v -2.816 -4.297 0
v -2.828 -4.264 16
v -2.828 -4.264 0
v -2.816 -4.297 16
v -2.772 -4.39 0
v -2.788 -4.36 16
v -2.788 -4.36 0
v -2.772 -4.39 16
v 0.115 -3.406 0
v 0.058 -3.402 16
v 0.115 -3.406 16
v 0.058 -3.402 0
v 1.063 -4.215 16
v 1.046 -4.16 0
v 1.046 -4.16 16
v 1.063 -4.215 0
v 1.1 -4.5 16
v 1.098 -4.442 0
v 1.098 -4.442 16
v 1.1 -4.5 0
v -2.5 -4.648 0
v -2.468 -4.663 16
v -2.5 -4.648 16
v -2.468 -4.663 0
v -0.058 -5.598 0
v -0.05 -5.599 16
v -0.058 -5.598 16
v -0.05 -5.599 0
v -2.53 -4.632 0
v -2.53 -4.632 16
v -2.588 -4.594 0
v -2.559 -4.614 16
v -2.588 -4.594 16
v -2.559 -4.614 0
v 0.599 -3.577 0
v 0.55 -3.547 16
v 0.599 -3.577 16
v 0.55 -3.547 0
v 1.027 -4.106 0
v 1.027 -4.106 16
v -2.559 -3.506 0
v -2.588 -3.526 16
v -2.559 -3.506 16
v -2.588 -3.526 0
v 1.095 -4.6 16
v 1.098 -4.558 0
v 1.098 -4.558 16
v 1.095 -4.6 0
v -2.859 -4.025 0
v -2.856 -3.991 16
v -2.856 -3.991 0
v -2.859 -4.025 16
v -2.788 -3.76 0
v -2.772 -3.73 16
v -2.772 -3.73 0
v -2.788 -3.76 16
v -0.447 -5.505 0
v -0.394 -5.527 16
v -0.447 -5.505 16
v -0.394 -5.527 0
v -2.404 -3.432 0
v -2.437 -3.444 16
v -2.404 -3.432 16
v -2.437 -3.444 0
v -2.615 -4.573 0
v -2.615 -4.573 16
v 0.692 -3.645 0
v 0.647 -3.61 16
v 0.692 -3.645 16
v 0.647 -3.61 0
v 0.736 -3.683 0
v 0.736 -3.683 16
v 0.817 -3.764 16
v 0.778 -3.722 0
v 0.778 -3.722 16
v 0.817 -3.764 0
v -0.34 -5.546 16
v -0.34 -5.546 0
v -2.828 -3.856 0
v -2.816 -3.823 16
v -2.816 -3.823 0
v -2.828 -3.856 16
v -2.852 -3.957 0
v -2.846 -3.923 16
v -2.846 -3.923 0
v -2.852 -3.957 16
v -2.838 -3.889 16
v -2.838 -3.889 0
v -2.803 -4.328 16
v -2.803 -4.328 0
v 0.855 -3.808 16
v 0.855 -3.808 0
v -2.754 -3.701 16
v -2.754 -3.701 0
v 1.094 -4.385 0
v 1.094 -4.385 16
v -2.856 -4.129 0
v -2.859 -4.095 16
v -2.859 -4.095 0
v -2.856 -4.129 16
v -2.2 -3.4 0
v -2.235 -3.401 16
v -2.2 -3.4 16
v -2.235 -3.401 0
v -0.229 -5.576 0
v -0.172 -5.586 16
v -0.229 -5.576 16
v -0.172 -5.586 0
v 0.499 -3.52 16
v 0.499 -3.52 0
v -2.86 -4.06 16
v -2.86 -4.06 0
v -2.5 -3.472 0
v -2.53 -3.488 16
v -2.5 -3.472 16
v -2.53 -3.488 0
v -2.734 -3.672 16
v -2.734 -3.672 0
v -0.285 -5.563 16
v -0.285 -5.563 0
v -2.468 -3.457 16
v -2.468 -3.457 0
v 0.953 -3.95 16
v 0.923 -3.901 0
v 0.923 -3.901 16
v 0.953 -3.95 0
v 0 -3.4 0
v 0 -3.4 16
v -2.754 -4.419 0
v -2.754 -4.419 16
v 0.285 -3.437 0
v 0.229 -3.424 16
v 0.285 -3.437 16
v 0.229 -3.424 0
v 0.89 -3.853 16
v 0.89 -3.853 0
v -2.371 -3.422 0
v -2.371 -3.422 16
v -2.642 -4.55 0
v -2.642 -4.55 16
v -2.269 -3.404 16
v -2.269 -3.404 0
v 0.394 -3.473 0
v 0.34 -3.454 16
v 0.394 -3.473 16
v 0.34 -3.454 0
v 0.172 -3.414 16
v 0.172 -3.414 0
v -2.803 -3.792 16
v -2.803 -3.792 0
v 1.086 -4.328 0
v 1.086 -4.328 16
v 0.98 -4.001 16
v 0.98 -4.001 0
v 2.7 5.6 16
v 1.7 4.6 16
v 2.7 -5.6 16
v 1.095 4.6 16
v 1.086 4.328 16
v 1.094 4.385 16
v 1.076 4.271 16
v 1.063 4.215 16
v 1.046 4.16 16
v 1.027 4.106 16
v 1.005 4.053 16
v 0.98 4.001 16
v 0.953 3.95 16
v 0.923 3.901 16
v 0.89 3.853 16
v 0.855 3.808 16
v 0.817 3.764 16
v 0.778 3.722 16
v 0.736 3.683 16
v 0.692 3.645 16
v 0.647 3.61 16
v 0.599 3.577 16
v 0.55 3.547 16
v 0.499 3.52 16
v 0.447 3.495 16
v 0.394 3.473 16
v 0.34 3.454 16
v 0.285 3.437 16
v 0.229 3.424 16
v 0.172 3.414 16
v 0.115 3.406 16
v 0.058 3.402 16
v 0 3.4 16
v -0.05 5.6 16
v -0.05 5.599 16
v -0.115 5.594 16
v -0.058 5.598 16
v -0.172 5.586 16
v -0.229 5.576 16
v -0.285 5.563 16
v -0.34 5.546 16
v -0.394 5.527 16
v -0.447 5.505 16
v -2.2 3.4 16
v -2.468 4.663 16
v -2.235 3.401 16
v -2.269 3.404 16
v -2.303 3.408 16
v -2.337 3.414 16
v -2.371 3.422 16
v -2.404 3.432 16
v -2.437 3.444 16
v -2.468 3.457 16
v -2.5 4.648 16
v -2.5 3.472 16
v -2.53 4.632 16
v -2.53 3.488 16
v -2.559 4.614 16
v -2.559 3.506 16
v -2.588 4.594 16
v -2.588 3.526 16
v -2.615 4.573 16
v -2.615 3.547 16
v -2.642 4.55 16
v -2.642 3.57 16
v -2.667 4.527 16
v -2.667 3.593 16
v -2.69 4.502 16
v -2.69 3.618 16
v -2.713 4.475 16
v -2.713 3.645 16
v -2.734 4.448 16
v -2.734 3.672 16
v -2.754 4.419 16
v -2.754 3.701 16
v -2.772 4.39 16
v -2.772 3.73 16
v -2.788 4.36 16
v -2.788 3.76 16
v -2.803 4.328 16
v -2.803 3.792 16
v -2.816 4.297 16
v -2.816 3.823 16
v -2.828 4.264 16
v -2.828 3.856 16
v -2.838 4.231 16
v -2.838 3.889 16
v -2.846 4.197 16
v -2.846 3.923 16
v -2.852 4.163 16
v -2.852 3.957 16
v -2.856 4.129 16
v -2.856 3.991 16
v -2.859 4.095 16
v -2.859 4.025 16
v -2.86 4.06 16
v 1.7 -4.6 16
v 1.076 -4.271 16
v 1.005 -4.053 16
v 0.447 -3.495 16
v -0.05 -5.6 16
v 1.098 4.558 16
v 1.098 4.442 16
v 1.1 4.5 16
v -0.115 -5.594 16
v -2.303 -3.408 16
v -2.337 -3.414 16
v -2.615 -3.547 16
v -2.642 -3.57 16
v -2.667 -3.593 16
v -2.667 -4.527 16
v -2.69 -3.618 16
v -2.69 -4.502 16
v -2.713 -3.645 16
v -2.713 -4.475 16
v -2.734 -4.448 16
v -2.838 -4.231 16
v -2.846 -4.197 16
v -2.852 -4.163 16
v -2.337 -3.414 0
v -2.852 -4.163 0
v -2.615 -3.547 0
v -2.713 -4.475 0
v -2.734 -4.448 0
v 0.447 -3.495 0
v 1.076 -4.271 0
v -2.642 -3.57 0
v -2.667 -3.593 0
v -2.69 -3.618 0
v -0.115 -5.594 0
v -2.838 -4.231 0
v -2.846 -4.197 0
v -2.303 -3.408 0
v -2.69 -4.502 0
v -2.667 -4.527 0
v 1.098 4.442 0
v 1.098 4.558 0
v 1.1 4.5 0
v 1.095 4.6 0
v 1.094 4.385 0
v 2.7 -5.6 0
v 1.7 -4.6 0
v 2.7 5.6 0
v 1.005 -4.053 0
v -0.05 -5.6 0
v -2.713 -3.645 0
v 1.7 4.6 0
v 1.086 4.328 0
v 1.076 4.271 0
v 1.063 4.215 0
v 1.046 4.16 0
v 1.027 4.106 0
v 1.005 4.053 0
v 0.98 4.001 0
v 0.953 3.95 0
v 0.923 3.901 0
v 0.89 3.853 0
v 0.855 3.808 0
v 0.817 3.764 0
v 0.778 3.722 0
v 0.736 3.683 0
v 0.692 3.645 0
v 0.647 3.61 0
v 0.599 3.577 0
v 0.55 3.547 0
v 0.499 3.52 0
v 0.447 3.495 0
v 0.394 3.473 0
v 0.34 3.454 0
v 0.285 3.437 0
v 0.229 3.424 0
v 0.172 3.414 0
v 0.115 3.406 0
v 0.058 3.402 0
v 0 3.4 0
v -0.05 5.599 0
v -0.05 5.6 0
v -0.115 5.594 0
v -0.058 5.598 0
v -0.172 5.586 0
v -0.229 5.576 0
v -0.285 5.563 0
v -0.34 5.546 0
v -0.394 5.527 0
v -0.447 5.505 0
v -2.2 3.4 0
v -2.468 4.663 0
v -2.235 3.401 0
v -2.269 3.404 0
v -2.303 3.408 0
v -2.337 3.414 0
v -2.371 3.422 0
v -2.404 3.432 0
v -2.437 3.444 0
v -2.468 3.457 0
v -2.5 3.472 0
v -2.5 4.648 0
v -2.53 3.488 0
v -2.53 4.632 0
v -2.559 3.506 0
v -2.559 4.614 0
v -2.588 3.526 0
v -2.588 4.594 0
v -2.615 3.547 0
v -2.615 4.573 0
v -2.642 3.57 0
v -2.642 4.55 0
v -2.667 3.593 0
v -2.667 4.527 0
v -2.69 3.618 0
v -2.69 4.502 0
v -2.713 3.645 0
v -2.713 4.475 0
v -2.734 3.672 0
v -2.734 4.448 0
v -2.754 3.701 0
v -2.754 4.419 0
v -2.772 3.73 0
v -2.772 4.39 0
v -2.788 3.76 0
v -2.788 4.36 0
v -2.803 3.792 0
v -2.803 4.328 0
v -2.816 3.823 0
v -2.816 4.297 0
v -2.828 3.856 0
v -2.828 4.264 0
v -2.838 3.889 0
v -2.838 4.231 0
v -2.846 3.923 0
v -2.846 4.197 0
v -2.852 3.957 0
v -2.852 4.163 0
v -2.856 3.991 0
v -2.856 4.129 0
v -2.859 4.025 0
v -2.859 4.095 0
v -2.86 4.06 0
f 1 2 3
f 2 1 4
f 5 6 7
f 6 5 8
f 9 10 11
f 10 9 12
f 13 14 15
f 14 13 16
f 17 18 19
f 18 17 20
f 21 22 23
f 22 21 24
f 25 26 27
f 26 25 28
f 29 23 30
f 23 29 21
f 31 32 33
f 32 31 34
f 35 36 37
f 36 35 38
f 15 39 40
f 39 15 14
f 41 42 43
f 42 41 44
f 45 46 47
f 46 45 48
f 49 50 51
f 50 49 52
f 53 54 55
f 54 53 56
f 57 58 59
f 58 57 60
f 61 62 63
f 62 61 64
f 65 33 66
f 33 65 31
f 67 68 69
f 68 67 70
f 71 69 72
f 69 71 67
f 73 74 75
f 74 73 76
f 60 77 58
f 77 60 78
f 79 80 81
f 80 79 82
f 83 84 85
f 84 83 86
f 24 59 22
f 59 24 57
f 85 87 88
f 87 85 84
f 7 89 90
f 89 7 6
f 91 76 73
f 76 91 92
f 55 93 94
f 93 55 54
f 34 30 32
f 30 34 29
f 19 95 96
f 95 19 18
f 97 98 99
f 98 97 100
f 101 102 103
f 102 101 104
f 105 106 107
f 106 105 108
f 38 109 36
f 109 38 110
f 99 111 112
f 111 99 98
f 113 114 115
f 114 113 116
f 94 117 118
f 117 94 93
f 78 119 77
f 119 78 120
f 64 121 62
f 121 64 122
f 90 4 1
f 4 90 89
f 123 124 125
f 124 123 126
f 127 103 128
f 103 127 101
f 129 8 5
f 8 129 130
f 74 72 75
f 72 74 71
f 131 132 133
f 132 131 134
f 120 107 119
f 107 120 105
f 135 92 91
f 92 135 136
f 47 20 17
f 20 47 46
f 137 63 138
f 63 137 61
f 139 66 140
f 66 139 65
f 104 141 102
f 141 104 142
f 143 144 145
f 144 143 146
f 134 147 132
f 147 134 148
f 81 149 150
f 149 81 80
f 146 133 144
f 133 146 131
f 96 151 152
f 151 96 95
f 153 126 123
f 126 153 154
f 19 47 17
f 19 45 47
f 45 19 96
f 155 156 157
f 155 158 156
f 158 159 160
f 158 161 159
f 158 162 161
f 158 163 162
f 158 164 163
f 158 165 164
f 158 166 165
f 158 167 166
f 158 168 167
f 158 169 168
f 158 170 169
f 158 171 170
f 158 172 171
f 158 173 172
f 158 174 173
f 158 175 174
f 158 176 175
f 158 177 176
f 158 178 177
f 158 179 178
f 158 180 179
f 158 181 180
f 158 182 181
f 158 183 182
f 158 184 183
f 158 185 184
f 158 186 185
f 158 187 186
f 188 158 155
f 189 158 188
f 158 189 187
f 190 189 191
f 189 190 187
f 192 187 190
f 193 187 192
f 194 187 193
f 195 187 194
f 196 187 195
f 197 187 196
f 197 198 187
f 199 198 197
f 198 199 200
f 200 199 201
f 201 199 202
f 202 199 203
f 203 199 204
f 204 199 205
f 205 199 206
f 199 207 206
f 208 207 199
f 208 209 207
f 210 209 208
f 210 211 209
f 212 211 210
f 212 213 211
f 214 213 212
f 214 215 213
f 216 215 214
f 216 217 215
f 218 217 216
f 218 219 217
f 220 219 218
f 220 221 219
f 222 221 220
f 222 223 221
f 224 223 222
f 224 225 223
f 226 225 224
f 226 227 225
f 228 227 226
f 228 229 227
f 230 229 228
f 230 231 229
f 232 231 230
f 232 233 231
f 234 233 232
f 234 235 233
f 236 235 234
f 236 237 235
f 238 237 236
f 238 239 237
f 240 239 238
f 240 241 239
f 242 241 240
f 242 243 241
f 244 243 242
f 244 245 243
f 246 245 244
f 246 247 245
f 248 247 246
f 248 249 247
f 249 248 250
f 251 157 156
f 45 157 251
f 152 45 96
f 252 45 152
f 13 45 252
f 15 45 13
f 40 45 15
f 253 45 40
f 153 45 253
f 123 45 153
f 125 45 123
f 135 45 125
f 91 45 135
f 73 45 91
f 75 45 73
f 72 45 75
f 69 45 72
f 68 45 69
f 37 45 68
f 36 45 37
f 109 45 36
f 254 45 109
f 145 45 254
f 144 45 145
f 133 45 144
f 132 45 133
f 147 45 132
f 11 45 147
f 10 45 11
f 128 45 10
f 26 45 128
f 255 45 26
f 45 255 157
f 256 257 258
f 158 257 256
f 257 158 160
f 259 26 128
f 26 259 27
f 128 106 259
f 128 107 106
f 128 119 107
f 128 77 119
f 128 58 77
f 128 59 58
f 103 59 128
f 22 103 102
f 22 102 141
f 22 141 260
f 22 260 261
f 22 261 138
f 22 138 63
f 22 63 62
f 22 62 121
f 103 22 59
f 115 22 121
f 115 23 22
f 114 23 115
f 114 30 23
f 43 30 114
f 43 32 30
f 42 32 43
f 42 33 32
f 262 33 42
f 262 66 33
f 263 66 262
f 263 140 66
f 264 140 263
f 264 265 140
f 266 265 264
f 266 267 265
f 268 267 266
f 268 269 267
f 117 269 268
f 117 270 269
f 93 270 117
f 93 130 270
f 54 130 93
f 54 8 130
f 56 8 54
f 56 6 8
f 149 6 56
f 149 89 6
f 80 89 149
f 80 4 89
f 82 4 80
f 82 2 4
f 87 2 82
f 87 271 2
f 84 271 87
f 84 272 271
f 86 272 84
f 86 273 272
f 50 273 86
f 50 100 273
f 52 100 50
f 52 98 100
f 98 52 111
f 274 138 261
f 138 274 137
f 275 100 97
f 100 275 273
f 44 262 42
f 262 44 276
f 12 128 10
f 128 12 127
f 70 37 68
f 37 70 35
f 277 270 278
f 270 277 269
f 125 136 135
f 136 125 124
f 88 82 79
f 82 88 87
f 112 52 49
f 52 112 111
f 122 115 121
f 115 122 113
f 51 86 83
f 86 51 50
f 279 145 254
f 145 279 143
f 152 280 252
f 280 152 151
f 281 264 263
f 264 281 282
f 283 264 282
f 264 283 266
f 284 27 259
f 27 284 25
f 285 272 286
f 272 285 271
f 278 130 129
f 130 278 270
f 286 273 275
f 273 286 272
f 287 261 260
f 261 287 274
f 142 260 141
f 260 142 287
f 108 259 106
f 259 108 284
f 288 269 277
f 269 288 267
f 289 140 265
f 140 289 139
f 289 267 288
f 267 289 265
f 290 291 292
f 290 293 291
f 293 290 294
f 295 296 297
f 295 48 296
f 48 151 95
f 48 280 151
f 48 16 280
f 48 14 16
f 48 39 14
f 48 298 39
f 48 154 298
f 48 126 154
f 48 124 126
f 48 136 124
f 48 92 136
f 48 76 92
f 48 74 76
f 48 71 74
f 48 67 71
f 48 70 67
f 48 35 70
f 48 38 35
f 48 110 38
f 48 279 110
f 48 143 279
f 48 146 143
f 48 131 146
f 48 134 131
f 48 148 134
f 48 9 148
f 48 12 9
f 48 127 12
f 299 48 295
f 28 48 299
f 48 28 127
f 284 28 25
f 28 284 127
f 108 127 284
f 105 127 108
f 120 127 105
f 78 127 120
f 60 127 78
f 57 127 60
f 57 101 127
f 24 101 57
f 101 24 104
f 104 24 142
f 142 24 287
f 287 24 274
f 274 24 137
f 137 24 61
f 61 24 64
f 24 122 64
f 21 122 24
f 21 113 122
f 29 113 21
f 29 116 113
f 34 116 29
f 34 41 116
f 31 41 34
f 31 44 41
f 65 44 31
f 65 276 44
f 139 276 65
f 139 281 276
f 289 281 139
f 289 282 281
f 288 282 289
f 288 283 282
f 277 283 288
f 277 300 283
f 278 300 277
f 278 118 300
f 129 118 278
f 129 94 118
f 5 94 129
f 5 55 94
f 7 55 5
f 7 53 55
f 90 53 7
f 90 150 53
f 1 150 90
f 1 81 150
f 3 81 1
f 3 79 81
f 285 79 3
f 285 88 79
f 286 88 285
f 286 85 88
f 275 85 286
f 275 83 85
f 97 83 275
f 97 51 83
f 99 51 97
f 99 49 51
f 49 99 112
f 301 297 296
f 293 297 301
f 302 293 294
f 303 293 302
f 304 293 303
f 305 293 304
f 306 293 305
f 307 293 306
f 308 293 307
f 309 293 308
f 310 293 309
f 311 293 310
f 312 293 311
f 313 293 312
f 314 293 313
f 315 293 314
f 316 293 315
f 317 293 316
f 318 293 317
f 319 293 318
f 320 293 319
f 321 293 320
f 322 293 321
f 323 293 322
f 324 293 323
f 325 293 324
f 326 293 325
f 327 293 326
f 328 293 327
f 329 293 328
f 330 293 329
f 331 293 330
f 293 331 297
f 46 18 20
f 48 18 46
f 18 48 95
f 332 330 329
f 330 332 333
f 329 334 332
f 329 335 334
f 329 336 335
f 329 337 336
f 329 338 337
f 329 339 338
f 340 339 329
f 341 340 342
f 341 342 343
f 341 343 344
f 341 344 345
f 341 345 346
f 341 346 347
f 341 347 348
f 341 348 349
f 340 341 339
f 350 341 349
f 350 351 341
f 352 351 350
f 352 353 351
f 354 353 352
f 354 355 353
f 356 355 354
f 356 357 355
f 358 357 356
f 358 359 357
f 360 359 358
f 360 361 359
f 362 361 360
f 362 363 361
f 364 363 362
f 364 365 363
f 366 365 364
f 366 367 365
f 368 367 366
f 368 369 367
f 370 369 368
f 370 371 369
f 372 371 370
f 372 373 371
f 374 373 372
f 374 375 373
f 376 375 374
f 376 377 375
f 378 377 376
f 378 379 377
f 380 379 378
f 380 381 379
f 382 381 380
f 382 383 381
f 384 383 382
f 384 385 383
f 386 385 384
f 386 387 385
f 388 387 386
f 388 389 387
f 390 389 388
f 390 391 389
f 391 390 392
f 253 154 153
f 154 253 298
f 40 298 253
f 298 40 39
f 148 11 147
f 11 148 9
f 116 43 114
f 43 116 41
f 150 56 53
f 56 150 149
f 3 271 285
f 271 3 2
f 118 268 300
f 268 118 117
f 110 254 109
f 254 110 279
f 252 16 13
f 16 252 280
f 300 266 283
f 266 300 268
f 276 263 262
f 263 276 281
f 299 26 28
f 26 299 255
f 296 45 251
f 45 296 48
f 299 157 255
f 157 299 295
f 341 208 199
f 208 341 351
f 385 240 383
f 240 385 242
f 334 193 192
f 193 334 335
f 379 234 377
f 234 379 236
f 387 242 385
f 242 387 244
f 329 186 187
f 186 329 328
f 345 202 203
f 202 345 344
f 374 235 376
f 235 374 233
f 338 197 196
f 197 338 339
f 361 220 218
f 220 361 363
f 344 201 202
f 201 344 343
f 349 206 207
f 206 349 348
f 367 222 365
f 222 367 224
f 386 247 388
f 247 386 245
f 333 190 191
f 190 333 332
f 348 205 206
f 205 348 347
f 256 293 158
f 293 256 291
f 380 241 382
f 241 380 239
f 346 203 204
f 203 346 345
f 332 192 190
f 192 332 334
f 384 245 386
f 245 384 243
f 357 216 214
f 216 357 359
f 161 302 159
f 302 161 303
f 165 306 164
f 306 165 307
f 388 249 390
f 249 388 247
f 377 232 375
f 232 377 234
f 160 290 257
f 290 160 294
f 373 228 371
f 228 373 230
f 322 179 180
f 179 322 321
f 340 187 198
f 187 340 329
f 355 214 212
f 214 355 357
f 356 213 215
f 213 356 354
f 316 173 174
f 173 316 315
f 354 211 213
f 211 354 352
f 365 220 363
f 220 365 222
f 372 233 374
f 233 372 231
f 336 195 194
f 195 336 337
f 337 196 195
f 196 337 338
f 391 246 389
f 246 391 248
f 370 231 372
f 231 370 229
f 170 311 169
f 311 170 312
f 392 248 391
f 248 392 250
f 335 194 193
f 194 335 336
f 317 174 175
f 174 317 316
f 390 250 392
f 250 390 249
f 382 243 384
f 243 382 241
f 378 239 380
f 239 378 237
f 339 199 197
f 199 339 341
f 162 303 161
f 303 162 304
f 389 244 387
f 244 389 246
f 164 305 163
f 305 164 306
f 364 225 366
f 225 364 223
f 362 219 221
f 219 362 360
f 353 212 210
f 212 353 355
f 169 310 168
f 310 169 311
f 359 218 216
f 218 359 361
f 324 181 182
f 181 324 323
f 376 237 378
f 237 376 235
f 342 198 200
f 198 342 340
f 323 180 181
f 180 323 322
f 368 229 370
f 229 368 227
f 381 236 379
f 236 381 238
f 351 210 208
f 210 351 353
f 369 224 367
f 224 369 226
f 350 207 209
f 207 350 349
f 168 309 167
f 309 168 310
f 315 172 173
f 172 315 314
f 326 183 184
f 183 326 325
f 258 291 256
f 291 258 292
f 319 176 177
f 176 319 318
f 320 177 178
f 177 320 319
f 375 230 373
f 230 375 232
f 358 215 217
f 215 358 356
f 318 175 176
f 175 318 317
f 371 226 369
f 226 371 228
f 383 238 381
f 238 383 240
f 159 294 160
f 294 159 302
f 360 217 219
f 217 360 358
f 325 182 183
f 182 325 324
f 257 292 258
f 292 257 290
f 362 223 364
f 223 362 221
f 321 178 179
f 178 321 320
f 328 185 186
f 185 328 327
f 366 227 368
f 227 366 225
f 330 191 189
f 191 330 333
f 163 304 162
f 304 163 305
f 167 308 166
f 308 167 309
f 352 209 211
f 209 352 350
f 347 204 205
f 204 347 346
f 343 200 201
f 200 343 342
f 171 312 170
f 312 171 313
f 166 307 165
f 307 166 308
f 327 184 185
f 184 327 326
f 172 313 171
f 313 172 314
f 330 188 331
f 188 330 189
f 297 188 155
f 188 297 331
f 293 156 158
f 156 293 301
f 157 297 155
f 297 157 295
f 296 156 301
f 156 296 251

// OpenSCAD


_style = "square"; // [round, square]

// height of the platform (use a slightly smaller value, about 0.2mm to make the clip tight)
_platformGap = 6.8;


// length of the clip
_length = 16.0; //[4:50]


// thickness of the clip.
_wallThickness = 1.0;


// size of the top of the clip
_diameter = 2.2;

////////////////////////////////////////////////////////////////////////

// only works from [0 to 180] degrees, runs clockwise from 12 o'clock
module smallArc(radius0, radius1, angle, depth) {
	thickness = radius1 - radius0;
	eps = 0.01;

	union() {
		difference() {
			// full arc
			cylinder(r=radius1, h=depth, center=true);
			cylinder(r=radius0, h=depth+2*eps, center=true);

			for(z=[0, 180 - angle]) {
				rotate([0,0,z])
				translate([-radius1,0,0])			
				cube(size = [radius1*2, radius1*2, depth+eps], center=true);
			}
		}
	}
}



// arc from [0 to 360] degrees with rounded ends, runs clockwise from 12 o'clock, rounded tips not included in angle computation
module roundArc(radius0, radius1, angle, depth) {
	thickness = radius1 - radius0;
	cutAngle = 360-angle;
	centerRadius = (radius0 + radius1)/2.0;
	union() {
		if (angle > 180) {
			smallArc(radius0, radius1, 180, depth);
			rotate([0,0,-180]) {
				smallArc(radius0, radius1, angle-180, depth);
			}
		} else {
			smallArc(radius0, radius1, angle, depth);
		}

		// round ends
		for(t = [ [0,centerRadius,0], 
					 [centerRadius * -sin(cutAngle), centerRadius * cos(cutAngle),0] ]) {
			translate(t) {
				cylinder(r=thickness/2, h=depth, center=true);
			}
		}
	}
}

module clip(arcRadius, angle, height, outerThickness, hingeRadius, hingeAngle, clipAngle, hingeGap) {
	ir = arcRadius;
	or = ir + outerThickness;
	clipRadius = hingeRadius;
	hx = (ir-hingeRadius)*sin(angle/2);
	hy = (ir-hingeRadius)*cos(angle/2);
	cx = (ir-clipRadius)*sin(angle/2);
	cy = (ir-clipRadius)*cos(angle/2);

	union() {

		difference() {
			//	spine
			rotate([0,0,angle/2]) {
				roundArc(ir, or, angle, height);
			}
		}

		// hinge
		translate([-hx, hy, 0])
		rotate([0,0,angle/2+hingeAngle]) {
			roundArc(hingeRadius, hingeRadius+outerThickness, hingeAngle, height);
		}

		// clip
		translate([cx, cy, 0])
		rotate([0,0,-angle/2]) {
			roundArc(clipRadius, clipRadius+outerThickness, clipAngle, height);
		}
	}
}

// reuse code from the arc clip
module buildRoundClip(gap, width, wall, diameter) {
	curvature = 25;
	clipAngle = 120;
	hingeAngle = 280 - wall*10;
	length = gap + diameter/3 + wall; // approximate
	radius = length / (2 *(curvature/100));
	angle = 2 * asin(length/(2*radius));

	translate([0,-radius,width/2]) {
		clip(radius, angle, width, wall, diameter/2, hingeAngle, clipAngle);
	}
}
////////////////////////////////////////////////////////////////////////

module buildSquareClip(gap, width, wall, diameter) {
	radius = diameter/2;
	tipRadius = diameter * 0.3;
	clipDepth = 1.0; // depth of the clip prongs
	space = 0.6; // space between clip and spine
	eps = 0.1;
	for (y = [-1,1]) {
		hull() {
			translate([0,y*(gap/2 + radius),0]) {
				cylinder(r=radius, h=width);
			}
			translate([-diameter*clipDepth,y*(gap/2 + tipRadius),0]) {
				cylinder(r=tipRadius, h=width);
			}
		}
		
		translate([(radius+space)/2, y*(gap/2 + diameter - wall/2), width/2]) {
			cube(size=[radius + space + eps, wall, width], center=true);
		}
	}
	translate([radius + space + wall/2, 0, width/2]) {
		cube(size=[wall, gap + diameter*2, width], center=true);
	}
}

module make($fn = 120) {
	if (_style == "round") {
		buildRoundClip(_platformGap, _length, _wallThickness, _diameter);
	} else {
		buildSquareClip(_platformGap, _length, _wallThickness, _diameter);
	}
}

make();
